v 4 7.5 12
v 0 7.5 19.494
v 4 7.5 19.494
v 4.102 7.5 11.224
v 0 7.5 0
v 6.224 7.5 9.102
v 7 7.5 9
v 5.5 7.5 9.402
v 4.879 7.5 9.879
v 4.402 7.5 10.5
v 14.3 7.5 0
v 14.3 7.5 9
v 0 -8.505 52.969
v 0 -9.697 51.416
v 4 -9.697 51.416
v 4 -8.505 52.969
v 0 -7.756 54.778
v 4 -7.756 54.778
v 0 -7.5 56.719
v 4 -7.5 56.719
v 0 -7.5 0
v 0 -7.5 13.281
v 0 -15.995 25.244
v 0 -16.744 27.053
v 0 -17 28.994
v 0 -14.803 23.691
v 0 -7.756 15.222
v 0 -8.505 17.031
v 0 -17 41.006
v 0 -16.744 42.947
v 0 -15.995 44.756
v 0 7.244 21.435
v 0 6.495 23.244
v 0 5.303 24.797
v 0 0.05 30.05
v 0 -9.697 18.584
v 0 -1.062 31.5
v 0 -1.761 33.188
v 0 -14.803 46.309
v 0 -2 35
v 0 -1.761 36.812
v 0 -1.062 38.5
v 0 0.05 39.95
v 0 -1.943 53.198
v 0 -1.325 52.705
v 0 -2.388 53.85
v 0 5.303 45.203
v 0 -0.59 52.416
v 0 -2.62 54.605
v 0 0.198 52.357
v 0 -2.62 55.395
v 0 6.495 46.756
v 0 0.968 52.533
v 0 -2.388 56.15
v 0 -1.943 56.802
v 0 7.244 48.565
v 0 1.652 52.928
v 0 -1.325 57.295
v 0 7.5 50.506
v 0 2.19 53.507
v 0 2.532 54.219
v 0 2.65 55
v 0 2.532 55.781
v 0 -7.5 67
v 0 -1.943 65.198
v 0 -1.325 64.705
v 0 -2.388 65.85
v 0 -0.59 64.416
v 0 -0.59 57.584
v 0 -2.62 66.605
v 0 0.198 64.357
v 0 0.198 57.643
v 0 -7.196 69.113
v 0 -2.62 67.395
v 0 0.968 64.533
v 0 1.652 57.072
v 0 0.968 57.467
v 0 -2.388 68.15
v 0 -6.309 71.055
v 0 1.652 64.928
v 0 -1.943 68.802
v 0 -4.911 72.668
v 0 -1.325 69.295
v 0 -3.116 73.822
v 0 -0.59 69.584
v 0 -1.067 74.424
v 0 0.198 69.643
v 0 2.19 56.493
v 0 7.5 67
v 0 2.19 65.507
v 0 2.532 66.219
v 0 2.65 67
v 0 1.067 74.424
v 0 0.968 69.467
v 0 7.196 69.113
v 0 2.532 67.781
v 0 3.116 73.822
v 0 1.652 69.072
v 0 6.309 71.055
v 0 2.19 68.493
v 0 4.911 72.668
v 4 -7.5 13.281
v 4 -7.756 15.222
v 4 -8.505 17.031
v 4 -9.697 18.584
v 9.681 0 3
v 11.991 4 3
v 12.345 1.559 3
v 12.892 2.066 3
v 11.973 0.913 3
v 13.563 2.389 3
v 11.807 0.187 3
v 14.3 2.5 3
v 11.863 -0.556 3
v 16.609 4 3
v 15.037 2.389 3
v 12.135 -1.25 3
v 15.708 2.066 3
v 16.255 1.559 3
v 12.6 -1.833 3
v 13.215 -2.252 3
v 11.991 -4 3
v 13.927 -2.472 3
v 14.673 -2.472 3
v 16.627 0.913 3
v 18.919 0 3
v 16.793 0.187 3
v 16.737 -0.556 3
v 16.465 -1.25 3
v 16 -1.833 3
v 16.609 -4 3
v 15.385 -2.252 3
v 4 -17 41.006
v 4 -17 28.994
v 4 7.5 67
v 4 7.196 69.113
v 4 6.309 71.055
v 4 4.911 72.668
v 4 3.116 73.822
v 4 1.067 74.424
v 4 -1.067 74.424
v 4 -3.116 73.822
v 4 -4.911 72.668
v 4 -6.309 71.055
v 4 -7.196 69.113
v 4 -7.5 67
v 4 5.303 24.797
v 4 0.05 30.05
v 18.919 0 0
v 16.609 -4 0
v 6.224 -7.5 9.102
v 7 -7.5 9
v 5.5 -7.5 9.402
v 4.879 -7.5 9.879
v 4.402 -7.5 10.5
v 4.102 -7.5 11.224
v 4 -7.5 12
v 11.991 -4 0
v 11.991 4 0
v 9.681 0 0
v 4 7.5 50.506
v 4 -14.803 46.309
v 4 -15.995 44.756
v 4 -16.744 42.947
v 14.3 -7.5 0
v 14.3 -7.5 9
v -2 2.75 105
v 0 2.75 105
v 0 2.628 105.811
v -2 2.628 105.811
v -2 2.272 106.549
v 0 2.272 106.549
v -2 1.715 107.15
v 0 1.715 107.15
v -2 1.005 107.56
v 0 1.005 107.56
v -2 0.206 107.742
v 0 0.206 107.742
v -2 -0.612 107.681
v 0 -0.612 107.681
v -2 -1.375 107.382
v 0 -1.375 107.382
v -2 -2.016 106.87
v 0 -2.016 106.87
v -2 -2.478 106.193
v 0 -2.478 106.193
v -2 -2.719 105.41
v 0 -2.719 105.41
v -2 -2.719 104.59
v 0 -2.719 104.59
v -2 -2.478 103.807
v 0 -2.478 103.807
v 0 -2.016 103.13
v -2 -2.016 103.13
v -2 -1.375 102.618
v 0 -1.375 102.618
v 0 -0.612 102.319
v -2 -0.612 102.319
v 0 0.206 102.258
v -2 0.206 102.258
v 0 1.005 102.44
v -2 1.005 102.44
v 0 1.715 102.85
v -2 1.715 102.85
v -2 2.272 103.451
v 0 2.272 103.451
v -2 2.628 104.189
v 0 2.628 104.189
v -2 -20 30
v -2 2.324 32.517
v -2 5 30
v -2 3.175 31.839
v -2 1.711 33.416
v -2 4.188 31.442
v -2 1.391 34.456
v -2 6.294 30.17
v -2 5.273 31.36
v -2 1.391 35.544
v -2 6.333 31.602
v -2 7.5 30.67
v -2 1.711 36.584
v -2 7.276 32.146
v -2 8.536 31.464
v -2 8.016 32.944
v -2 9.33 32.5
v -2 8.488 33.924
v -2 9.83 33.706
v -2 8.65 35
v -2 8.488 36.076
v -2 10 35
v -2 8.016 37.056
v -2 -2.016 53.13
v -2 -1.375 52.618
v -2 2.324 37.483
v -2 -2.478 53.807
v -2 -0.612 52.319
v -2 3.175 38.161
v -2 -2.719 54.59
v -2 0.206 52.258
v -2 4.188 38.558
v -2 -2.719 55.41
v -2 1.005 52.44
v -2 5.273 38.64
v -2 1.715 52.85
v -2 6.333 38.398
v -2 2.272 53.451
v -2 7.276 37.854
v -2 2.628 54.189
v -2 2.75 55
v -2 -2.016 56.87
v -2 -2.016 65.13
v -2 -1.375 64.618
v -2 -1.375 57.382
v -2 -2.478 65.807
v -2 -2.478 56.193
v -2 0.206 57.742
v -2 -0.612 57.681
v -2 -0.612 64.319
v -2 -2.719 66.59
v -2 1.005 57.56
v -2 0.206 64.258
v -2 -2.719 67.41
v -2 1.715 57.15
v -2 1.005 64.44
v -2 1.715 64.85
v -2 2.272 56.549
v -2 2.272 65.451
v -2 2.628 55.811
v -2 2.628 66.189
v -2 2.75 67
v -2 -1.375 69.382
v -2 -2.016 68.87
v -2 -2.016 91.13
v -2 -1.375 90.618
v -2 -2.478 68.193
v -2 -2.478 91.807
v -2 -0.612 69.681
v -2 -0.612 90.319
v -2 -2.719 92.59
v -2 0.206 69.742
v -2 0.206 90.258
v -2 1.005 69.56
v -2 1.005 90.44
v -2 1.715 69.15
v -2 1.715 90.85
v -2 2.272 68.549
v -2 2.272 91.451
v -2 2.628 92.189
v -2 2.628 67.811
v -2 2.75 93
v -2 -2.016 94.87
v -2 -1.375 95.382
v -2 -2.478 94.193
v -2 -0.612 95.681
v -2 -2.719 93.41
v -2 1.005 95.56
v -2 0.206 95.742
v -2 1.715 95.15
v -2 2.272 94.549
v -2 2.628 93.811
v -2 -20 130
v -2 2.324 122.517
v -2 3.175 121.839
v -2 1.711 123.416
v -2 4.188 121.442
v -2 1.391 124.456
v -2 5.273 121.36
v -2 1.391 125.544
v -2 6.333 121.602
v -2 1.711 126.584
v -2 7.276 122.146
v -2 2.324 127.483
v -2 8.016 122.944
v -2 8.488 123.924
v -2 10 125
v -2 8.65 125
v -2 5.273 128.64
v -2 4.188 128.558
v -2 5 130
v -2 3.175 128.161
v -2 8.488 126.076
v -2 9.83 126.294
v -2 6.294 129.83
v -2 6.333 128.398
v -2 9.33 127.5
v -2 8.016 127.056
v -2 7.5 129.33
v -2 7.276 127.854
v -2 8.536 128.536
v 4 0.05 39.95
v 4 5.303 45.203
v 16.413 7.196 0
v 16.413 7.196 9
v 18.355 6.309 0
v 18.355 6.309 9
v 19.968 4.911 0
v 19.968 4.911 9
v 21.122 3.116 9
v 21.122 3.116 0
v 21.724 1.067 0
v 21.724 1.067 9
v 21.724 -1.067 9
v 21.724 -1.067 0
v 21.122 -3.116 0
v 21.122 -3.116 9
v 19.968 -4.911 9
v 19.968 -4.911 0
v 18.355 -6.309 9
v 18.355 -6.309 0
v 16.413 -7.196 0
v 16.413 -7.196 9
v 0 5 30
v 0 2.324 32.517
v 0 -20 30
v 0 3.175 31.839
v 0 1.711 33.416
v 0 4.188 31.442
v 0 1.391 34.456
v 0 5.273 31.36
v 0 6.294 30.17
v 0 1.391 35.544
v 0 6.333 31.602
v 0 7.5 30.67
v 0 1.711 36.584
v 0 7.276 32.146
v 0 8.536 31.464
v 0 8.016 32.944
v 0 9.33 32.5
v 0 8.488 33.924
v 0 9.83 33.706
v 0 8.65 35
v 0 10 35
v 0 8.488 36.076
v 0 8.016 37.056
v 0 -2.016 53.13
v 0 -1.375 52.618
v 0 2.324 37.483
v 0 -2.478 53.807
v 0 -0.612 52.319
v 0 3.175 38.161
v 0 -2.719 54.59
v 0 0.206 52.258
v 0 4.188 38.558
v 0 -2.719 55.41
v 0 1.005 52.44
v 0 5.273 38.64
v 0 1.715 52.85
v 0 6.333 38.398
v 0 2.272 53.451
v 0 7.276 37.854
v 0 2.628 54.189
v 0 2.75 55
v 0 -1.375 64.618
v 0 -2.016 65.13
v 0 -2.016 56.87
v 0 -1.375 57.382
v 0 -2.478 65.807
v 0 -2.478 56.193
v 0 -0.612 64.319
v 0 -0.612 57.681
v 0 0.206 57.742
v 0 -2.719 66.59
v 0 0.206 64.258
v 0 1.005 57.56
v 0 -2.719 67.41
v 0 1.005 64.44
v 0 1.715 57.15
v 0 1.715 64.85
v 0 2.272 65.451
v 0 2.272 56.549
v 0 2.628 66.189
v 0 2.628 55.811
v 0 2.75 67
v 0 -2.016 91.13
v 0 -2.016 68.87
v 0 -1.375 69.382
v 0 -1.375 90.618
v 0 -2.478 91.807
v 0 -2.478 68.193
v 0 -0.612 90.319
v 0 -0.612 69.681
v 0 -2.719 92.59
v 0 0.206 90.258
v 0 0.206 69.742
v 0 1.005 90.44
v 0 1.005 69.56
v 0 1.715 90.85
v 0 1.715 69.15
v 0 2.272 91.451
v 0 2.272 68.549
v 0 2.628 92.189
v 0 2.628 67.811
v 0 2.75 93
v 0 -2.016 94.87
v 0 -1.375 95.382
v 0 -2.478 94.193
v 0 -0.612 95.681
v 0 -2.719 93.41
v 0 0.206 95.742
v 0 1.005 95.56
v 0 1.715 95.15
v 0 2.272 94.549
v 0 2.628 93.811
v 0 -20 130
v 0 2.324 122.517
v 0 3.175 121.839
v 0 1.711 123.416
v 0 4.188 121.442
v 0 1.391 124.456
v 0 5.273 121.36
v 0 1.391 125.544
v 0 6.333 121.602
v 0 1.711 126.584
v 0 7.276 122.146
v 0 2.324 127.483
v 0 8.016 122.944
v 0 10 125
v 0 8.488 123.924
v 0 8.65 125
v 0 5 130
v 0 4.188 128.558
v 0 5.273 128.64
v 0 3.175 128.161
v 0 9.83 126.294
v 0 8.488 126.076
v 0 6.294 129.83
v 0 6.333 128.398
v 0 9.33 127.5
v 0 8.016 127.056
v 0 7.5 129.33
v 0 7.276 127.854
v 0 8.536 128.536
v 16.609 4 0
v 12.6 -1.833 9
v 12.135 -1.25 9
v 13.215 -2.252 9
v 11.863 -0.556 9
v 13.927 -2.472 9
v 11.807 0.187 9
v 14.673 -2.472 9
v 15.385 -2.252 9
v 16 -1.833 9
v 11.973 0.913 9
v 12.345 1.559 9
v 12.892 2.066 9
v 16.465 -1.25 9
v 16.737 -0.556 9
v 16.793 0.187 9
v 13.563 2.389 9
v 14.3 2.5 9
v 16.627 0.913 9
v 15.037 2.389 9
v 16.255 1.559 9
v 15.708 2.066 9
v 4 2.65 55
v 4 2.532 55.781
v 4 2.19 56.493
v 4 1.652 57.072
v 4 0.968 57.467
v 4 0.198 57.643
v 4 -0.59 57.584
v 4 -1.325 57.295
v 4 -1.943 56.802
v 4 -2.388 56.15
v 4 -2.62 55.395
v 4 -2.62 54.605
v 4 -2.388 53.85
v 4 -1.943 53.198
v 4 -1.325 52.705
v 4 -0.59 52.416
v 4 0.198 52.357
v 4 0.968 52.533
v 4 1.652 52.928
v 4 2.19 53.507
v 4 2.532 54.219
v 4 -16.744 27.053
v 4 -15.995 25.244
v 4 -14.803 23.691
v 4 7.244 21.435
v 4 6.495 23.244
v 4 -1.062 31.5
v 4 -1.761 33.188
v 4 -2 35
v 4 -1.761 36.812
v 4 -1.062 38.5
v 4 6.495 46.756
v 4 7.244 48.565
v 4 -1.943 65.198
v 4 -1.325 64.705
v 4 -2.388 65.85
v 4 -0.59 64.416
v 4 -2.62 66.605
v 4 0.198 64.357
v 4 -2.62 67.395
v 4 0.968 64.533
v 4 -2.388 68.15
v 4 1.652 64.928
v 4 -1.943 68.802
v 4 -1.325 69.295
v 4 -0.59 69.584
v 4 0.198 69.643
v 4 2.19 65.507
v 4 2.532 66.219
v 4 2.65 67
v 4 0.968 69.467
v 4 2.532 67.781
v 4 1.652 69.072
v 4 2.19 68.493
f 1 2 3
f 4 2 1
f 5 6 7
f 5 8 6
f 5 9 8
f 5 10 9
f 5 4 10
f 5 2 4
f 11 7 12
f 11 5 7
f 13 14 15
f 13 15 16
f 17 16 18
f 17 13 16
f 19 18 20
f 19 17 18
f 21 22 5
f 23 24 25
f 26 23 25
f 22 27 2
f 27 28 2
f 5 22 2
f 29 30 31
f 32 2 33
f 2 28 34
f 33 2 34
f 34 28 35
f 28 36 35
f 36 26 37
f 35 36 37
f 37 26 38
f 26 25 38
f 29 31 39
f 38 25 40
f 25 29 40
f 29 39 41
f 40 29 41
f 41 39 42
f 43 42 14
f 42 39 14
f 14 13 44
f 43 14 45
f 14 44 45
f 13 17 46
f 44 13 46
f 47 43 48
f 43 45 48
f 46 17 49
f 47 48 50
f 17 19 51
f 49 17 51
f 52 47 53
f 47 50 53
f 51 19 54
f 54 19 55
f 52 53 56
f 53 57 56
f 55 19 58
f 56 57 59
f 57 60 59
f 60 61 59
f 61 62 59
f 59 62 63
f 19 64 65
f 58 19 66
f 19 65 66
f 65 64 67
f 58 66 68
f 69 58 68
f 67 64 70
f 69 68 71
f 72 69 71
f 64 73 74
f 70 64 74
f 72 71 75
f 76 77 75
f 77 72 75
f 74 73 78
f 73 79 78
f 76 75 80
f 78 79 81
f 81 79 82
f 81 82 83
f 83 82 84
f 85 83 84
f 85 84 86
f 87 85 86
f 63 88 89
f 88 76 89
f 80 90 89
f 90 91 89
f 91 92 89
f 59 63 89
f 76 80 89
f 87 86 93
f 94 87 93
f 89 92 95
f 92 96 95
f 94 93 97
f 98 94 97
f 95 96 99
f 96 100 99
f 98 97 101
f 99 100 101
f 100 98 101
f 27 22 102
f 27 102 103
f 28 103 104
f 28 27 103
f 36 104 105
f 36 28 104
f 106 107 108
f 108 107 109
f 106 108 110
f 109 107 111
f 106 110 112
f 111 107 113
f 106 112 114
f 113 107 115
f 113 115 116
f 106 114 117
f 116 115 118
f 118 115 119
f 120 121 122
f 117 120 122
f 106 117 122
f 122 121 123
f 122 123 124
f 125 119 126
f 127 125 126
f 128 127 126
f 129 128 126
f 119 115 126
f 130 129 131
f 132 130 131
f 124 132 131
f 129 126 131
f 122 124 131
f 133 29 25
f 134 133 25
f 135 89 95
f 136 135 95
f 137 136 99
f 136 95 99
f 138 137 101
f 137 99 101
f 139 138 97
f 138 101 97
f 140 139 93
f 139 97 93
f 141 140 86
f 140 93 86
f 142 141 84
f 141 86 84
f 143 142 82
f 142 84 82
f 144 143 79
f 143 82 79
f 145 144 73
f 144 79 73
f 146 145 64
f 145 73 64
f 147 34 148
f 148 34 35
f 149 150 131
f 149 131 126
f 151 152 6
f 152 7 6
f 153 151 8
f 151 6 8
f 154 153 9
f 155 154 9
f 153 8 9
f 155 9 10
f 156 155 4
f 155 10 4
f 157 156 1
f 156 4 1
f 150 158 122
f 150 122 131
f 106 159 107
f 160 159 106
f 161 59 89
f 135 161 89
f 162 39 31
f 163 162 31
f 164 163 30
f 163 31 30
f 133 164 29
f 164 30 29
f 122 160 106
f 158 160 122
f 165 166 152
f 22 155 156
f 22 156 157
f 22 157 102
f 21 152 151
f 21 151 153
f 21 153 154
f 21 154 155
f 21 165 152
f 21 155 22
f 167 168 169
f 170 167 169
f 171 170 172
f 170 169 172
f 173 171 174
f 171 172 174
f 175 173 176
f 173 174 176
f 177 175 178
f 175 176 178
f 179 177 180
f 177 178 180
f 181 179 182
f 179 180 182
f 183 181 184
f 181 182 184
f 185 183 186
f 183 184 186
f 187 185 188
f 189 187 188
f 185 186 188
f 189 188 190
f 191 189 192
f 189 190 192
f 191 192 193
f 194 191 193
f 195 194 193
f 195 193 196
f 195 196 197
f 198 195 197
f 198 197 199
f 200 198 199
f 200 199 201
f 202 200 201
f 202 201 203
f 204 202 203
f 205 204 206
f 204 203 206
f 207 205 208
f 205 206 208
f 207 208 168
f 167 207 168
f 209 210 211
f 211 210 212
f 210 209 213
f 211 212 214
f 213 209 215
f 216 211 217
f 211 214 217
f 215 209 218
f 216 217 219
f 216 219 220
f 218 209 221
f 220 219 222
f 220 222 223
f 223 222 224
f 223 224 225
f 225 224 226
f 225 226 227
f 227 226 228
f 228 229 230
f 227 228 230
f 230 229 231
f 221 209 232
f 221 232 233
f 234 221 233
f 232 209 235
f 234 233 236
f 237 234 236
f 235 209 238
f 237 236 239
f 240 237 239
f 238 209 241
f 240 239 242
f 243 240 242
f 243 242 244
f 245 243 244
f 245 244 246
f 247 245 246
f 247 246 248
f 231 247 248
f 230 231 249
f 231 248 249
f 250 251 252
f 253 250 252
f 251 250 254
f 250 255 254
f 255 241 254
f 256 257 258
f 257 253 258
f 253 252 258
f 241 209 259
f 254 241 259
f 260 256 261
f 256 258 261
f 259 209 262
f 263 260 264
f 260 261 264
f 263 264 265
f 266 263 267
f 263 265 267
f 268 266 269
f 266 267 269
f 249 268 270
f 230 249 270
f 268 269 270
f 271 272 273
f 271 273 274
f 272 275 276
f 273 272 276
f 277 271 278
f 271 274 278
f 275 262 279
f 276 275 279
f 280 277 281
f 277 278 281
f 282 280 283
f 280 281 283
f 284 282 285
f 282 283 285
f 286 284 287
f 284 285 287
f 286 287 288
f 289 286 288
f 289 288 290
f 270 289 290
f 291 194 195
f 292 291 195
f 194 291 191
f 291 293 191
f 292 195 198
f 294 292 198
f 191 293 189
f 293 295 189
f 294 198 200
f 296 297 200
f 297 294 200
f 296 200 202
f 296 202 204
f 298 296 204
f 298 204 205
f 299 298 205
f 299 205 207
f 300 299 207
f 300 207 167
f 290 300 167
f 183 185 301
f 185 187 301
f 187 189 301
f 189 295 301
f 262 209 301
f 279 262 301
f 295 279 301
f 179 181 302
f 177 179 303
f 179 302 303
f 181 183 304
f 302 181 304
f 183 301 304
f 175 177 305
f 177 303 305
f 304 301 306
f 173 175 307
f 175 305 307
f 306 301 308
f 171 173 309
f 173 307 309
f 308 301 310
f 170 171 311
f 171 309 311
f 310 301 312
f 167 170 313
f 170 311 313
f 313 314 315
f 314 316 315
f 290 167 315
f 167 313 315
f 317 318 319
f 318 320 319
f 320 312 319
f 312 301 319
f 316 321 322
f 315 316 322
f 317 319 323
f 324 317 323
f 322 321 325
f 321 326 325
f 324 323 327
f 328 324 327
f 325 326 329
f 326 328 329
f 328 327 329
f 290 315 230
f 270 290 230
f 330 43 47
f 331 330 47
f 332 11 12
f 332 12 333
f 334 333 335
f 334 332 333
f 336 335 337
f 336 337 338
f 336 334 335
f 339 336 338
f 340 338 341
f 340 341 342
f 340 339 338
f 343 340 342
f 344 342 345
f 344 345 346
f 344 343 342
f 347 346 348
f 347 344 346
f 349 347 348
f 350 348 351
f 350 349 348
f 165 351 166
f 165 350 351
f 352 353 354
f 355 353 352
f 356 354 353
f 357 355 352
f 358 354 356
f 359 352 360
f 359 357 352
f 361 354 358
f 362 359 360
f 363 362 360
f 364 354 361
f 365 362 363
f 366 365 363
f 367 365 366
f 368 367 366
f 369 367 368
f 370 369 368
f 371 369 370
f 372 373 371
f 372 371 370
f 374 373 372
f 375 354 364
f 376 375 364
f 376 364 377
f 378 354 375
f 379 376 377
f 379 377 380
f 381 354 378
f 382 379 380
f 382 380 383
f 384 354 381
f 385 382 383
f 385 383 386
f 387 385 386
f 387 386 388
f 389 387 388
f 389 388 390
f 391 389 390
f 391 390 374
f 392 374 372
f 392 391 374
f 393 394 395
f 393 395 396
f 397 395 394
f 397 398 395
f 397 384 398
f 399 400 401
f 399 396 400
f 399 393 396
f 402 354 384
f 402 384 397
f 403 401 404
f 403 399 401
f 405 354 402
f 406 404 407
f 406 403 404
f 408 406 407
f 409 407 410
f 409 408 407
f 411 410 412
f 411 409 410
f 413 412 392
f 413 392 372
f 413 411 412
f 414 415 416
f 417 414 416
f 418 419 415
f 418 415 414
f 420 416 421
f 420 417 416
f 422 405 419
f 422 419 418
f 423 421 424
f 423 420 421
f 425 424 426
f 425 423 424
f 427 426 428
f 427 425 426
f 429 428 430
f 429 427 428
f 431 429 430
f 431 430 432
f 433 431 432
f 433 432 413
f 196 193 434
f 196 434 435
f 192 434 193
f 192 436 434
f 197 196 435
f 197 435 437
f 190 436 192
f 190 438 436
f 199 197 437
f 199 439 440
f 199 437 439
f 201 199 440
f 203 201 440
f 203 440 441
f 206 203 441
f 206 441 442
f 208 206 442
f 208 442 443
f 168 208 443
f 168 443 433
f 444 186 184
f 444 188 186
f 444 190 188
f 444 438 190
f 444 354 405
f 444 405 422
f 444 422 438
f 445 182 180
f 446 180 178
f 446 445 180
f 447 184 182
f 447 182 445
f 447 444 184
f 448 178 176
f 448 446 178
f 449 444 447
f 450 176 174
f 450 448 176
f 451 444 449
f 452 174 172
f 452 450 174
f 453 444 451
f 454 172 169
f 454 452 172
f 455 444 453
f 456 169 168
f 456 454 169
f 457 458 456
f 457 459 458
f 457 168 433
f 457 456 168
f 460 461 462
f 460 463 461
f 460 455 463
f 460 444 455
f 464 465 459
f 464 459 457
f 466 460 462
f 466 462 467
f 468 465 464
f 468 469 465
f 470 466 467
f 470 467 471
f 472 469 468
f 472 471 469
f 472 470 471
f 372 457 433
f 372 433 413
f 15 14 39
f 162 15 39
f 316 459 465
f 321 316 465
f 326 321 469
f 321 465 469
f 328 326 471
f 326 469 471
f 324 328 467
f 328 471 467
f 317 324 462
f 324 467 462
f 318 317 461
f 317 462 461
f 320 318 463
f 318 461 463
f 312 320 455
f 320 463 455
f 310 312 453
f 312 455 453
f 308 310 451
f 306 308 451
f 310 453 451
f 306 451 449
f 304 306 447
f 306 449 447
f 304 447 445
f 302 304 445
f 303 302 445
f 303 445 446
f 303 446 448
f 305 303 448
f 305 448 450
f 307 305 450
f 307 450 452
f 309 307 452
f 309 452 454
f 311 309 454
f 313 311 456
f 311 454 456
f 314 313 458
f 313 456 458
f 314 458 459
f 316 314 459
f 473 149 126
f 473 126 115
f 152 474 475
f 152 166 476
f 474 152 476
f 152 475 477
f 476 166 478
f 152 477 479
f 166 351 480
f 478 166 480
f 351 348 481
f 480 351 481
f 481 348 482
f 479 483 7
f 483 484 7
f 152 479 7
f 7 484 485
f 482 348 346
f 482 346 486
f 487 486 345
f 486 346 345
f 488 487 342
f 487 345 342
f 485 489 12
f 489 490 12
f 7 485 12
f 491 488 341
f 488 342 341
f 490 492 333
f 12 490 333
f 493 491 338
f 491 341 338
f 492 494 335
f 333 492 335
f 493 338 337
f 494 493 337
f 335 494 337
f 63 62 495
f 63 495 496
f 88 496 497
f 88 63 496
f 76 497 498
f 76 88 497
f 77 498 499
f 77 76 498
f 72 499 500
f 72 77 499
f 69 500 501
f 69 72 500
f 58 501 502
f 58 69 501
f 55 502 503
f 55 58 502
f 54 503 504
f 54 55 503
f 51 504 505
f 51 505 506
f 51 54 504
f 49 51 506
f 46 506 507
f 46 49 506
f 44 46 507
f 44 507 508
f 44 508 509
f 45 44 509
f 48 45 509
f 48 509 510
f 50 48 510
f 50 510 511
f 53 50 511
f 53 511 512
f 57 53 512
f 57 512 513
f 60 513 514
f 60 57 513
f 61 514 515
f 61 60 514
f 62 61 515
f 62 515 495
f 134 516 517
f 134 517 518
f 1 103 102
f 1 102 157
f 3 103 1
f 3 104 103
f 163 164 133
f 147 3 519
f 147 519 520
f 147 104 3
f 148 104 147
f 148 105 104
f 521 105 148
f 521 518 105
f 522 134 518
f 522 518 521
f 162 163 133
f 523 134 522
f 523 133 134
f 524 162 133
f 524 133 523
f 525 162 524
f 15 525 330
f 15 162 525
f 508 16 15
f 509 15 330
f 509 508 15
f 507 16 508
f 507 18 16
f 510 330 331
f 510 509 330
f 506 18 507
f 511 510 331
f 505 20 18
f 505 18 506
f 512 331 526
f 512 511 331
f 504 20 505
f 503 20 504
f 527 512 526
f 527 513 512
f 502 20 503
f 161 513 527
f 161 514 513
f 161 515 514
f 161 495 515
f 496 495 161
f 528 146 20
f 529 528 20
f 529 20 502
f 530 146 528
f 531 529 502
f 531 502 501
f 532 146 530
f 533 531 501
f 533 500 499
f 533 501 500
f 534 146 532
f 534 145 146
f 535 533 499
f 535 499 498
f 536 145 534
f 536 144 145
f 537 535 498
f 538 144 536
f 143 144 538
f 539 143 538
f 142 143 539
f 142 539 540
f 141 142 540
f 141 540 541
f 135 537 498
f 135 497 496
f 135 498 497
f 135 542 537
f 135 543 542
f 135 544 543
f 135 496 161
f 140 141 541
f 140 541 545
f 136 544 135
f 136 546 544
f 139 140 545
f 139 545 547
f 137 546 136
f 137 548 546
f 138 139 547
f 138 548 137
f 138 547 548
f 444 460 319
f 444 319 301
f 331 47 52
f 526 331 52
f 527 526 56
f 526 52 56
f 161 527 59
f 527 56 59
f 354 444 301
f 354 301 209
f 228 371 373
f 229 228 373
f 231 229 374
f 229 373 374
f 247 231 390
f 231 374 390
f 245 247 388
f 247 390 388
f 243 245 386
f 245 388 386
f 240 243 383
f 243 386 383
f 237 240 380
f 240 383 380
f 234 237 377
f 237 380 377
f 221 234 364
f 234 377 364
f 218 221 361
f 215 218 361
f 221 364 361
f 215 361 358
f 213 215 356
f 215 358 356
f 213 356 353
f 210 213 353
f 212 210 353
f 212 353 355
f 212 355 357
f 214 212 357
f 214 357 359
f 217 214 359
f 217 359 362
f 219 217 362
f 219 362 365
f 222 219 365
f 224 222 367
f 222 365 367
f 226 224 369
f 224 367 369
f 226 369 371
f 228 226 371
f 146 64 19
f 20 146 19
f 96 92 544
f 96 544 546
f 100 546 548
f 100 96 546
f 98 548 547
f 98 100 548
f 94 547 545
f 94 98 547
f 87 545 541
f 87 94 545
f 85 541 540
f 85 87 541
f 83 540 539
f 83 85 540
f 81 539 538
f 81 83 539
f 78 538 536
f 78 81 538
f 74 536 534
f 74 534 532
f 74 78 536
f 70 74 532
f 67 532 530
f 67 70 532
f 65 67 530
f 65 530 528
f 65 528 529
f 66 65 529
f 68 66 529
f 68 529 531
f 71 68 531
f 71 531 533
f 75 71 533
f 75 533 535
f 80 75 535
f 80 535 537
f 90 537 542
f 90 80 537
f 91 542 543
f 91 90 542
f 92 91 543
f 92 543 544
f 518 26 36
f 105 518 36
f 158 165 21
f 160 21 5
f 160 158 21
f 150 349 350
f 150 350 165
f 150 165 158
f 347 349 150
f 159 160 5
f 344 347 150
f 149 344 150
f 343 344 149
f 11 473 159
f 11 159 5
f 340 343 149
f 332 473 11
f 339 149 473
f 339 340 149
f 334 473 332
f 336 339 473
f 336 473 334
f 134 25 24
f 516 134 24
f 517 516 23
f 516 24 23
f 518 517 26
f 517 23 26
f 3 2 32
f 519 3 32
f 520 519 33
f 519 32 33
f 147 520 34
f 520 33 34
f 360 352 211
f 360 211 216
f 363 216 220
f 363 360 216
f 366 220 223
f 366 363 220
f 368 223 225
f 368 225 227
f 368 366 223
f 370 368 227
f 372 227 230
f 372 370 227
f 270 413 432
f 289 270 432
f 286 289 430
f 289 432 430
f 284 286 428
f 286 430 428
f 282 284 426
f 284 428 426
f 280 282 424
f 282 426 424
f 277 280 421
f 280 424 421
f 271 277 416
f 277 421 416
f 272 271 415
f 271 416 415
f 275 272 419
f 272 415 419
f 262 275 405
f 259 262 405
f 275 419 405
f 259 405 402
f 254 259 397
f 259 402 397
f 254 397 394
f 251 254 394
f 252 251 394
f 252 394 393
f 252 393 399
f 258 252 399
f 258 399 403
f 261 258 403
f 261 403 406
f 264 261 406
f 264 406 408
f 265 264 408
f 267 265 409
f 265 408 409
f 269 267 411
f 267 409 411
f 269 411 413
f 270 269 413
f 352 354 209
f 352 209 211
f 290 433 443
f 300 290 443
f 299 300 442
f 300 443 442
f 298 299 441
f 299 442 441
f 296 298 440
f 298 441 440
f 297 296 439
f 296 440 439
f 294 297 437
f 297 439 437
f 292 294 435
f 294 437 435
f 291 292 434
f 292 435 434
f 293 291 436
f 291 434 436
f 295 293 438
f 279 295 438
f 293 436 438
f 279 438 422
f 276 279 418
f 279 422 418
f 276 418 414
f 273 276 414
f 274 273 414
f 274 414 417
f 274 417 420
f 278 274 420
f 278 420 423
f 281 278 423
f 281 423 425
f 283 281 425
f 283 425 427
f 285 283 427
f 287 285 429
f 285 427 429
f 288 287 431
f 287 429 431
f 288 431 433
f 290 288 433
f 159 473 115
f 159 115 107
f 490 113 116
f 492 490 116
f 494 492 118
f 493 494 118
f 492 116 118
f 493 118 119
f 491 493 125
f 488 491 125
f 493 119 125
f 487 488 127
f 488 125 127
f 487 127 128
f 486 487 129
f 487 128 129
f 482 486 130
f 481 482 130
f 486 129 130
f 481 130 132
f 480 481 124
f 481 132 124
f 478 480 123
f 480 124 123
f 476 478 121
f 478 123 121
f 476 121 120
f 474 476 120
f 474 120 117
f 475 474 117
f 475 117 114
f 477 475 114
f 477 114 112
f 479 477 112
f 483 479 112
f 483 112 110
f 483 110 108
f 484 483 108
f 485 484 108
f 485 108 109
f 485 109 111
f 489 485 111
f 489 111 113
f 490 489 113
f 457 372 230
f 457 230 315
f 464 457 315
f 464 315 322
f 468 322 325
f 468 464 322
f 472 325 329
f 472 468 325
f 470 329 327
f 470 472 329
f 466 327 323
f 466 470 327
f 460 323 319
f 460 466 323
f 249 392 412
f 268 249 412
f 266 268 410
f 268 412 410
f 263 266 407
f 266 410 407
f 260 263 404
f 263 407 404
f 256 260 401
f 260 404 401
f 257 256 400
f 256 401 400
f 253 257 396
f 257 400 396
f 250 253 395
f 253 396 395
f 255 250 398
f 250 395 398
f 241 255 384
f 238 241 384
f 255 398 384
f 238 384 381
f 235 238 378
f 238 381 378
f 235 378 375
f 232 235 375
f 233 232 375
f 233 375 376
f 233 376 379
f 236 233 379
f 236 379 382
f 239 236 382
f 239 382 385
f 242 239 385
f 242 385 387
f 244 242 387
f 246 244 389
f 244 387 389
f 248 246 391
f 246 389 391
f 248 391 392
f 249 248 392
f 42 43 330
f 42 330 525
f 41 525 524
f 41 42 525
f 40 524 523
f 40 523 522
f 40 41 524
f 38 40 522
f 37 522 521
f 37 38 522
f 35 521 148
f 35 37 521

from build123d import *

# Parameters (mm, degrees)
SKETCH_R     = 2.75
SKETCH_R_2   = 3.65
PAD_DEPTH    = 2
SKETCH001_R  = 2.65
PAD001_DEPTH = 4
SKETCH002_R  = 2.5
PAD002_DEPTH = 9
POCKET_DEPTH = 3
FILLET_R     = 3


with BuildPart() as z_plate:
    # Sketch → Pad (new body)
    with BuildSketch(Plane.YZ):
        with BuildLine():
            Line((-20, 30), (5, 30))
            ThreePointArc((5, 30), (8.535534, 31.464466), (10, 35))
            Line((10, 35), (10, 125))
            ThreePointArc((10, 125), (8.535534, 128.535534), (5, 130))
            Line((5, 130), (-20, 130))
            Line((-20, 130), (-20, 30))
        make_face()
        with Locations((0, 105)):
            Circle(SKETCH_R, mode=Mode.SUBTRACT)
        with Locations((0, 93)):
            Circle(SKETCH_R, mode=Mode.SUBTRACT)
        with Locations((0, 67)):
            Circle(SKETCH_R, mode=Mode.SUBTRACT)
        with Locations((0, 55)):
            Circle(SKETCH_R, mode=Mode.SUBTRACT)
        with Locations((5, 125)):
            Circle(SKETCH_R_2, mode=Mode.SUBTRACT)
        with Locations((5, 35)):
            Circle(SKETCH_R_2, mode=Mode.SUBTRACT)
    extrude(amount=-PAD_DEPTH)


with BuildPart() as z_endstop_screw_mount:
    # Sketch001 → Pad001 (new body)
    with BuildSketch(Plane.YZ):
        with BuildLine():
            Line((-7.5, 67), (-7.5, 56.7193))
            ThreePointArc((-9.696699, 51.415999), (-8.070904, 53.849174), (-7.5, 56.7193))
            Line((-9.696699, 51.415999), (-14.803301, 46.309398))
            ThreePointArc((-14.803301, 46.309398), (-16.429096, 43.876222), (-17, 41.006097))
            Line((-17, 41.006097), (-17, 28.993903))
            ThreePointArc((-17, 28.993903), (-16.429096, 26.123778), (-14.803301, 23.690602))
            Line((-14.803301, 23.690602), (-9.696699, 18.584001))
            ThreePointArc((-7.5, 13.2807), (-8.070904, 16.150826), (-9.696699, 18.584001))
            Line((-7.5, 13.2807), (-7.5, 0))
            Line((-7.5, 0), (7.5, 0))
            Line((7.5, 0), (7.5, 19.493903))
            ThreePointArc((7.5, 19.493903), (6.929096, 22.364029), (5.303301, 24.797204))
            Line((5.303301, 24.797204), (0.050253, 30.050253))
            ThreePointArc((0.050253, 39.949747), (-2, 35), (0.050253, 30.050253))
            Line((0.050253, 39.949747), (5.303301, 45.202796))
            ThreePointArc((5.303301, 45.202796), (6.929096, 47.635971), (7.5, 50.506097))
            Line((7.5, 50.506097), (7.5, 67))
            ThreePointArc((7.5, 67), (0, 74.5), (-7.5, 67))
        make_face()
        with Locations((0, 67)):
            Circle(SKETCH001_R, mode=Mode.SUBTRACT)
        with Locations((0, 55)):
            Circle(SKETCH001_R, mode=Mode.SUBTRACT)
    extrude(amount=PAD001_DEPTH)

    # Sketch002 → Pad002 (new body)
    with BuildSketch(Plane.YX):
        with BuildLine():
            Line((-7.5, 14.3), (-7.5, 4))
            Line((-7.5, 4), (7.5, 4))
            Line((7.5, 4), (7.5, 14.3))
            ThreePointArc((7.5, 14.3), (0, 21.8), (-7.5, 14.3))
        make_face()
        with Locations((0, 14.3)):
            Circle(SKETCH002_R, mode=Mode.SUBTRACT)
    extrude(amount=-PAD002_DEPTH)

    # Sketch003 → Pocket (cut)
    with BuildSketch(Plane.YX):
        Polygon((-4, 11.990599), (-4, 16.609401), (0, 18.918802), (4, 16.609401), (4, 11.990599), (0, 9.681198), align=None)
    extrude(amount=-POCKET_DEPTH, mode=Mode.SUBTRACT)

    # Fillet
    fillet_edges = [z_endstop_screw_mount.edges().sort_by_distance(p)[0] for p in [
        (4, 0, 9),
    ]]
    fillet(fillet_edges, radius=FILLET_R)


solid = Compound([z_plate.part, z_endstop_screw_mount.part])
